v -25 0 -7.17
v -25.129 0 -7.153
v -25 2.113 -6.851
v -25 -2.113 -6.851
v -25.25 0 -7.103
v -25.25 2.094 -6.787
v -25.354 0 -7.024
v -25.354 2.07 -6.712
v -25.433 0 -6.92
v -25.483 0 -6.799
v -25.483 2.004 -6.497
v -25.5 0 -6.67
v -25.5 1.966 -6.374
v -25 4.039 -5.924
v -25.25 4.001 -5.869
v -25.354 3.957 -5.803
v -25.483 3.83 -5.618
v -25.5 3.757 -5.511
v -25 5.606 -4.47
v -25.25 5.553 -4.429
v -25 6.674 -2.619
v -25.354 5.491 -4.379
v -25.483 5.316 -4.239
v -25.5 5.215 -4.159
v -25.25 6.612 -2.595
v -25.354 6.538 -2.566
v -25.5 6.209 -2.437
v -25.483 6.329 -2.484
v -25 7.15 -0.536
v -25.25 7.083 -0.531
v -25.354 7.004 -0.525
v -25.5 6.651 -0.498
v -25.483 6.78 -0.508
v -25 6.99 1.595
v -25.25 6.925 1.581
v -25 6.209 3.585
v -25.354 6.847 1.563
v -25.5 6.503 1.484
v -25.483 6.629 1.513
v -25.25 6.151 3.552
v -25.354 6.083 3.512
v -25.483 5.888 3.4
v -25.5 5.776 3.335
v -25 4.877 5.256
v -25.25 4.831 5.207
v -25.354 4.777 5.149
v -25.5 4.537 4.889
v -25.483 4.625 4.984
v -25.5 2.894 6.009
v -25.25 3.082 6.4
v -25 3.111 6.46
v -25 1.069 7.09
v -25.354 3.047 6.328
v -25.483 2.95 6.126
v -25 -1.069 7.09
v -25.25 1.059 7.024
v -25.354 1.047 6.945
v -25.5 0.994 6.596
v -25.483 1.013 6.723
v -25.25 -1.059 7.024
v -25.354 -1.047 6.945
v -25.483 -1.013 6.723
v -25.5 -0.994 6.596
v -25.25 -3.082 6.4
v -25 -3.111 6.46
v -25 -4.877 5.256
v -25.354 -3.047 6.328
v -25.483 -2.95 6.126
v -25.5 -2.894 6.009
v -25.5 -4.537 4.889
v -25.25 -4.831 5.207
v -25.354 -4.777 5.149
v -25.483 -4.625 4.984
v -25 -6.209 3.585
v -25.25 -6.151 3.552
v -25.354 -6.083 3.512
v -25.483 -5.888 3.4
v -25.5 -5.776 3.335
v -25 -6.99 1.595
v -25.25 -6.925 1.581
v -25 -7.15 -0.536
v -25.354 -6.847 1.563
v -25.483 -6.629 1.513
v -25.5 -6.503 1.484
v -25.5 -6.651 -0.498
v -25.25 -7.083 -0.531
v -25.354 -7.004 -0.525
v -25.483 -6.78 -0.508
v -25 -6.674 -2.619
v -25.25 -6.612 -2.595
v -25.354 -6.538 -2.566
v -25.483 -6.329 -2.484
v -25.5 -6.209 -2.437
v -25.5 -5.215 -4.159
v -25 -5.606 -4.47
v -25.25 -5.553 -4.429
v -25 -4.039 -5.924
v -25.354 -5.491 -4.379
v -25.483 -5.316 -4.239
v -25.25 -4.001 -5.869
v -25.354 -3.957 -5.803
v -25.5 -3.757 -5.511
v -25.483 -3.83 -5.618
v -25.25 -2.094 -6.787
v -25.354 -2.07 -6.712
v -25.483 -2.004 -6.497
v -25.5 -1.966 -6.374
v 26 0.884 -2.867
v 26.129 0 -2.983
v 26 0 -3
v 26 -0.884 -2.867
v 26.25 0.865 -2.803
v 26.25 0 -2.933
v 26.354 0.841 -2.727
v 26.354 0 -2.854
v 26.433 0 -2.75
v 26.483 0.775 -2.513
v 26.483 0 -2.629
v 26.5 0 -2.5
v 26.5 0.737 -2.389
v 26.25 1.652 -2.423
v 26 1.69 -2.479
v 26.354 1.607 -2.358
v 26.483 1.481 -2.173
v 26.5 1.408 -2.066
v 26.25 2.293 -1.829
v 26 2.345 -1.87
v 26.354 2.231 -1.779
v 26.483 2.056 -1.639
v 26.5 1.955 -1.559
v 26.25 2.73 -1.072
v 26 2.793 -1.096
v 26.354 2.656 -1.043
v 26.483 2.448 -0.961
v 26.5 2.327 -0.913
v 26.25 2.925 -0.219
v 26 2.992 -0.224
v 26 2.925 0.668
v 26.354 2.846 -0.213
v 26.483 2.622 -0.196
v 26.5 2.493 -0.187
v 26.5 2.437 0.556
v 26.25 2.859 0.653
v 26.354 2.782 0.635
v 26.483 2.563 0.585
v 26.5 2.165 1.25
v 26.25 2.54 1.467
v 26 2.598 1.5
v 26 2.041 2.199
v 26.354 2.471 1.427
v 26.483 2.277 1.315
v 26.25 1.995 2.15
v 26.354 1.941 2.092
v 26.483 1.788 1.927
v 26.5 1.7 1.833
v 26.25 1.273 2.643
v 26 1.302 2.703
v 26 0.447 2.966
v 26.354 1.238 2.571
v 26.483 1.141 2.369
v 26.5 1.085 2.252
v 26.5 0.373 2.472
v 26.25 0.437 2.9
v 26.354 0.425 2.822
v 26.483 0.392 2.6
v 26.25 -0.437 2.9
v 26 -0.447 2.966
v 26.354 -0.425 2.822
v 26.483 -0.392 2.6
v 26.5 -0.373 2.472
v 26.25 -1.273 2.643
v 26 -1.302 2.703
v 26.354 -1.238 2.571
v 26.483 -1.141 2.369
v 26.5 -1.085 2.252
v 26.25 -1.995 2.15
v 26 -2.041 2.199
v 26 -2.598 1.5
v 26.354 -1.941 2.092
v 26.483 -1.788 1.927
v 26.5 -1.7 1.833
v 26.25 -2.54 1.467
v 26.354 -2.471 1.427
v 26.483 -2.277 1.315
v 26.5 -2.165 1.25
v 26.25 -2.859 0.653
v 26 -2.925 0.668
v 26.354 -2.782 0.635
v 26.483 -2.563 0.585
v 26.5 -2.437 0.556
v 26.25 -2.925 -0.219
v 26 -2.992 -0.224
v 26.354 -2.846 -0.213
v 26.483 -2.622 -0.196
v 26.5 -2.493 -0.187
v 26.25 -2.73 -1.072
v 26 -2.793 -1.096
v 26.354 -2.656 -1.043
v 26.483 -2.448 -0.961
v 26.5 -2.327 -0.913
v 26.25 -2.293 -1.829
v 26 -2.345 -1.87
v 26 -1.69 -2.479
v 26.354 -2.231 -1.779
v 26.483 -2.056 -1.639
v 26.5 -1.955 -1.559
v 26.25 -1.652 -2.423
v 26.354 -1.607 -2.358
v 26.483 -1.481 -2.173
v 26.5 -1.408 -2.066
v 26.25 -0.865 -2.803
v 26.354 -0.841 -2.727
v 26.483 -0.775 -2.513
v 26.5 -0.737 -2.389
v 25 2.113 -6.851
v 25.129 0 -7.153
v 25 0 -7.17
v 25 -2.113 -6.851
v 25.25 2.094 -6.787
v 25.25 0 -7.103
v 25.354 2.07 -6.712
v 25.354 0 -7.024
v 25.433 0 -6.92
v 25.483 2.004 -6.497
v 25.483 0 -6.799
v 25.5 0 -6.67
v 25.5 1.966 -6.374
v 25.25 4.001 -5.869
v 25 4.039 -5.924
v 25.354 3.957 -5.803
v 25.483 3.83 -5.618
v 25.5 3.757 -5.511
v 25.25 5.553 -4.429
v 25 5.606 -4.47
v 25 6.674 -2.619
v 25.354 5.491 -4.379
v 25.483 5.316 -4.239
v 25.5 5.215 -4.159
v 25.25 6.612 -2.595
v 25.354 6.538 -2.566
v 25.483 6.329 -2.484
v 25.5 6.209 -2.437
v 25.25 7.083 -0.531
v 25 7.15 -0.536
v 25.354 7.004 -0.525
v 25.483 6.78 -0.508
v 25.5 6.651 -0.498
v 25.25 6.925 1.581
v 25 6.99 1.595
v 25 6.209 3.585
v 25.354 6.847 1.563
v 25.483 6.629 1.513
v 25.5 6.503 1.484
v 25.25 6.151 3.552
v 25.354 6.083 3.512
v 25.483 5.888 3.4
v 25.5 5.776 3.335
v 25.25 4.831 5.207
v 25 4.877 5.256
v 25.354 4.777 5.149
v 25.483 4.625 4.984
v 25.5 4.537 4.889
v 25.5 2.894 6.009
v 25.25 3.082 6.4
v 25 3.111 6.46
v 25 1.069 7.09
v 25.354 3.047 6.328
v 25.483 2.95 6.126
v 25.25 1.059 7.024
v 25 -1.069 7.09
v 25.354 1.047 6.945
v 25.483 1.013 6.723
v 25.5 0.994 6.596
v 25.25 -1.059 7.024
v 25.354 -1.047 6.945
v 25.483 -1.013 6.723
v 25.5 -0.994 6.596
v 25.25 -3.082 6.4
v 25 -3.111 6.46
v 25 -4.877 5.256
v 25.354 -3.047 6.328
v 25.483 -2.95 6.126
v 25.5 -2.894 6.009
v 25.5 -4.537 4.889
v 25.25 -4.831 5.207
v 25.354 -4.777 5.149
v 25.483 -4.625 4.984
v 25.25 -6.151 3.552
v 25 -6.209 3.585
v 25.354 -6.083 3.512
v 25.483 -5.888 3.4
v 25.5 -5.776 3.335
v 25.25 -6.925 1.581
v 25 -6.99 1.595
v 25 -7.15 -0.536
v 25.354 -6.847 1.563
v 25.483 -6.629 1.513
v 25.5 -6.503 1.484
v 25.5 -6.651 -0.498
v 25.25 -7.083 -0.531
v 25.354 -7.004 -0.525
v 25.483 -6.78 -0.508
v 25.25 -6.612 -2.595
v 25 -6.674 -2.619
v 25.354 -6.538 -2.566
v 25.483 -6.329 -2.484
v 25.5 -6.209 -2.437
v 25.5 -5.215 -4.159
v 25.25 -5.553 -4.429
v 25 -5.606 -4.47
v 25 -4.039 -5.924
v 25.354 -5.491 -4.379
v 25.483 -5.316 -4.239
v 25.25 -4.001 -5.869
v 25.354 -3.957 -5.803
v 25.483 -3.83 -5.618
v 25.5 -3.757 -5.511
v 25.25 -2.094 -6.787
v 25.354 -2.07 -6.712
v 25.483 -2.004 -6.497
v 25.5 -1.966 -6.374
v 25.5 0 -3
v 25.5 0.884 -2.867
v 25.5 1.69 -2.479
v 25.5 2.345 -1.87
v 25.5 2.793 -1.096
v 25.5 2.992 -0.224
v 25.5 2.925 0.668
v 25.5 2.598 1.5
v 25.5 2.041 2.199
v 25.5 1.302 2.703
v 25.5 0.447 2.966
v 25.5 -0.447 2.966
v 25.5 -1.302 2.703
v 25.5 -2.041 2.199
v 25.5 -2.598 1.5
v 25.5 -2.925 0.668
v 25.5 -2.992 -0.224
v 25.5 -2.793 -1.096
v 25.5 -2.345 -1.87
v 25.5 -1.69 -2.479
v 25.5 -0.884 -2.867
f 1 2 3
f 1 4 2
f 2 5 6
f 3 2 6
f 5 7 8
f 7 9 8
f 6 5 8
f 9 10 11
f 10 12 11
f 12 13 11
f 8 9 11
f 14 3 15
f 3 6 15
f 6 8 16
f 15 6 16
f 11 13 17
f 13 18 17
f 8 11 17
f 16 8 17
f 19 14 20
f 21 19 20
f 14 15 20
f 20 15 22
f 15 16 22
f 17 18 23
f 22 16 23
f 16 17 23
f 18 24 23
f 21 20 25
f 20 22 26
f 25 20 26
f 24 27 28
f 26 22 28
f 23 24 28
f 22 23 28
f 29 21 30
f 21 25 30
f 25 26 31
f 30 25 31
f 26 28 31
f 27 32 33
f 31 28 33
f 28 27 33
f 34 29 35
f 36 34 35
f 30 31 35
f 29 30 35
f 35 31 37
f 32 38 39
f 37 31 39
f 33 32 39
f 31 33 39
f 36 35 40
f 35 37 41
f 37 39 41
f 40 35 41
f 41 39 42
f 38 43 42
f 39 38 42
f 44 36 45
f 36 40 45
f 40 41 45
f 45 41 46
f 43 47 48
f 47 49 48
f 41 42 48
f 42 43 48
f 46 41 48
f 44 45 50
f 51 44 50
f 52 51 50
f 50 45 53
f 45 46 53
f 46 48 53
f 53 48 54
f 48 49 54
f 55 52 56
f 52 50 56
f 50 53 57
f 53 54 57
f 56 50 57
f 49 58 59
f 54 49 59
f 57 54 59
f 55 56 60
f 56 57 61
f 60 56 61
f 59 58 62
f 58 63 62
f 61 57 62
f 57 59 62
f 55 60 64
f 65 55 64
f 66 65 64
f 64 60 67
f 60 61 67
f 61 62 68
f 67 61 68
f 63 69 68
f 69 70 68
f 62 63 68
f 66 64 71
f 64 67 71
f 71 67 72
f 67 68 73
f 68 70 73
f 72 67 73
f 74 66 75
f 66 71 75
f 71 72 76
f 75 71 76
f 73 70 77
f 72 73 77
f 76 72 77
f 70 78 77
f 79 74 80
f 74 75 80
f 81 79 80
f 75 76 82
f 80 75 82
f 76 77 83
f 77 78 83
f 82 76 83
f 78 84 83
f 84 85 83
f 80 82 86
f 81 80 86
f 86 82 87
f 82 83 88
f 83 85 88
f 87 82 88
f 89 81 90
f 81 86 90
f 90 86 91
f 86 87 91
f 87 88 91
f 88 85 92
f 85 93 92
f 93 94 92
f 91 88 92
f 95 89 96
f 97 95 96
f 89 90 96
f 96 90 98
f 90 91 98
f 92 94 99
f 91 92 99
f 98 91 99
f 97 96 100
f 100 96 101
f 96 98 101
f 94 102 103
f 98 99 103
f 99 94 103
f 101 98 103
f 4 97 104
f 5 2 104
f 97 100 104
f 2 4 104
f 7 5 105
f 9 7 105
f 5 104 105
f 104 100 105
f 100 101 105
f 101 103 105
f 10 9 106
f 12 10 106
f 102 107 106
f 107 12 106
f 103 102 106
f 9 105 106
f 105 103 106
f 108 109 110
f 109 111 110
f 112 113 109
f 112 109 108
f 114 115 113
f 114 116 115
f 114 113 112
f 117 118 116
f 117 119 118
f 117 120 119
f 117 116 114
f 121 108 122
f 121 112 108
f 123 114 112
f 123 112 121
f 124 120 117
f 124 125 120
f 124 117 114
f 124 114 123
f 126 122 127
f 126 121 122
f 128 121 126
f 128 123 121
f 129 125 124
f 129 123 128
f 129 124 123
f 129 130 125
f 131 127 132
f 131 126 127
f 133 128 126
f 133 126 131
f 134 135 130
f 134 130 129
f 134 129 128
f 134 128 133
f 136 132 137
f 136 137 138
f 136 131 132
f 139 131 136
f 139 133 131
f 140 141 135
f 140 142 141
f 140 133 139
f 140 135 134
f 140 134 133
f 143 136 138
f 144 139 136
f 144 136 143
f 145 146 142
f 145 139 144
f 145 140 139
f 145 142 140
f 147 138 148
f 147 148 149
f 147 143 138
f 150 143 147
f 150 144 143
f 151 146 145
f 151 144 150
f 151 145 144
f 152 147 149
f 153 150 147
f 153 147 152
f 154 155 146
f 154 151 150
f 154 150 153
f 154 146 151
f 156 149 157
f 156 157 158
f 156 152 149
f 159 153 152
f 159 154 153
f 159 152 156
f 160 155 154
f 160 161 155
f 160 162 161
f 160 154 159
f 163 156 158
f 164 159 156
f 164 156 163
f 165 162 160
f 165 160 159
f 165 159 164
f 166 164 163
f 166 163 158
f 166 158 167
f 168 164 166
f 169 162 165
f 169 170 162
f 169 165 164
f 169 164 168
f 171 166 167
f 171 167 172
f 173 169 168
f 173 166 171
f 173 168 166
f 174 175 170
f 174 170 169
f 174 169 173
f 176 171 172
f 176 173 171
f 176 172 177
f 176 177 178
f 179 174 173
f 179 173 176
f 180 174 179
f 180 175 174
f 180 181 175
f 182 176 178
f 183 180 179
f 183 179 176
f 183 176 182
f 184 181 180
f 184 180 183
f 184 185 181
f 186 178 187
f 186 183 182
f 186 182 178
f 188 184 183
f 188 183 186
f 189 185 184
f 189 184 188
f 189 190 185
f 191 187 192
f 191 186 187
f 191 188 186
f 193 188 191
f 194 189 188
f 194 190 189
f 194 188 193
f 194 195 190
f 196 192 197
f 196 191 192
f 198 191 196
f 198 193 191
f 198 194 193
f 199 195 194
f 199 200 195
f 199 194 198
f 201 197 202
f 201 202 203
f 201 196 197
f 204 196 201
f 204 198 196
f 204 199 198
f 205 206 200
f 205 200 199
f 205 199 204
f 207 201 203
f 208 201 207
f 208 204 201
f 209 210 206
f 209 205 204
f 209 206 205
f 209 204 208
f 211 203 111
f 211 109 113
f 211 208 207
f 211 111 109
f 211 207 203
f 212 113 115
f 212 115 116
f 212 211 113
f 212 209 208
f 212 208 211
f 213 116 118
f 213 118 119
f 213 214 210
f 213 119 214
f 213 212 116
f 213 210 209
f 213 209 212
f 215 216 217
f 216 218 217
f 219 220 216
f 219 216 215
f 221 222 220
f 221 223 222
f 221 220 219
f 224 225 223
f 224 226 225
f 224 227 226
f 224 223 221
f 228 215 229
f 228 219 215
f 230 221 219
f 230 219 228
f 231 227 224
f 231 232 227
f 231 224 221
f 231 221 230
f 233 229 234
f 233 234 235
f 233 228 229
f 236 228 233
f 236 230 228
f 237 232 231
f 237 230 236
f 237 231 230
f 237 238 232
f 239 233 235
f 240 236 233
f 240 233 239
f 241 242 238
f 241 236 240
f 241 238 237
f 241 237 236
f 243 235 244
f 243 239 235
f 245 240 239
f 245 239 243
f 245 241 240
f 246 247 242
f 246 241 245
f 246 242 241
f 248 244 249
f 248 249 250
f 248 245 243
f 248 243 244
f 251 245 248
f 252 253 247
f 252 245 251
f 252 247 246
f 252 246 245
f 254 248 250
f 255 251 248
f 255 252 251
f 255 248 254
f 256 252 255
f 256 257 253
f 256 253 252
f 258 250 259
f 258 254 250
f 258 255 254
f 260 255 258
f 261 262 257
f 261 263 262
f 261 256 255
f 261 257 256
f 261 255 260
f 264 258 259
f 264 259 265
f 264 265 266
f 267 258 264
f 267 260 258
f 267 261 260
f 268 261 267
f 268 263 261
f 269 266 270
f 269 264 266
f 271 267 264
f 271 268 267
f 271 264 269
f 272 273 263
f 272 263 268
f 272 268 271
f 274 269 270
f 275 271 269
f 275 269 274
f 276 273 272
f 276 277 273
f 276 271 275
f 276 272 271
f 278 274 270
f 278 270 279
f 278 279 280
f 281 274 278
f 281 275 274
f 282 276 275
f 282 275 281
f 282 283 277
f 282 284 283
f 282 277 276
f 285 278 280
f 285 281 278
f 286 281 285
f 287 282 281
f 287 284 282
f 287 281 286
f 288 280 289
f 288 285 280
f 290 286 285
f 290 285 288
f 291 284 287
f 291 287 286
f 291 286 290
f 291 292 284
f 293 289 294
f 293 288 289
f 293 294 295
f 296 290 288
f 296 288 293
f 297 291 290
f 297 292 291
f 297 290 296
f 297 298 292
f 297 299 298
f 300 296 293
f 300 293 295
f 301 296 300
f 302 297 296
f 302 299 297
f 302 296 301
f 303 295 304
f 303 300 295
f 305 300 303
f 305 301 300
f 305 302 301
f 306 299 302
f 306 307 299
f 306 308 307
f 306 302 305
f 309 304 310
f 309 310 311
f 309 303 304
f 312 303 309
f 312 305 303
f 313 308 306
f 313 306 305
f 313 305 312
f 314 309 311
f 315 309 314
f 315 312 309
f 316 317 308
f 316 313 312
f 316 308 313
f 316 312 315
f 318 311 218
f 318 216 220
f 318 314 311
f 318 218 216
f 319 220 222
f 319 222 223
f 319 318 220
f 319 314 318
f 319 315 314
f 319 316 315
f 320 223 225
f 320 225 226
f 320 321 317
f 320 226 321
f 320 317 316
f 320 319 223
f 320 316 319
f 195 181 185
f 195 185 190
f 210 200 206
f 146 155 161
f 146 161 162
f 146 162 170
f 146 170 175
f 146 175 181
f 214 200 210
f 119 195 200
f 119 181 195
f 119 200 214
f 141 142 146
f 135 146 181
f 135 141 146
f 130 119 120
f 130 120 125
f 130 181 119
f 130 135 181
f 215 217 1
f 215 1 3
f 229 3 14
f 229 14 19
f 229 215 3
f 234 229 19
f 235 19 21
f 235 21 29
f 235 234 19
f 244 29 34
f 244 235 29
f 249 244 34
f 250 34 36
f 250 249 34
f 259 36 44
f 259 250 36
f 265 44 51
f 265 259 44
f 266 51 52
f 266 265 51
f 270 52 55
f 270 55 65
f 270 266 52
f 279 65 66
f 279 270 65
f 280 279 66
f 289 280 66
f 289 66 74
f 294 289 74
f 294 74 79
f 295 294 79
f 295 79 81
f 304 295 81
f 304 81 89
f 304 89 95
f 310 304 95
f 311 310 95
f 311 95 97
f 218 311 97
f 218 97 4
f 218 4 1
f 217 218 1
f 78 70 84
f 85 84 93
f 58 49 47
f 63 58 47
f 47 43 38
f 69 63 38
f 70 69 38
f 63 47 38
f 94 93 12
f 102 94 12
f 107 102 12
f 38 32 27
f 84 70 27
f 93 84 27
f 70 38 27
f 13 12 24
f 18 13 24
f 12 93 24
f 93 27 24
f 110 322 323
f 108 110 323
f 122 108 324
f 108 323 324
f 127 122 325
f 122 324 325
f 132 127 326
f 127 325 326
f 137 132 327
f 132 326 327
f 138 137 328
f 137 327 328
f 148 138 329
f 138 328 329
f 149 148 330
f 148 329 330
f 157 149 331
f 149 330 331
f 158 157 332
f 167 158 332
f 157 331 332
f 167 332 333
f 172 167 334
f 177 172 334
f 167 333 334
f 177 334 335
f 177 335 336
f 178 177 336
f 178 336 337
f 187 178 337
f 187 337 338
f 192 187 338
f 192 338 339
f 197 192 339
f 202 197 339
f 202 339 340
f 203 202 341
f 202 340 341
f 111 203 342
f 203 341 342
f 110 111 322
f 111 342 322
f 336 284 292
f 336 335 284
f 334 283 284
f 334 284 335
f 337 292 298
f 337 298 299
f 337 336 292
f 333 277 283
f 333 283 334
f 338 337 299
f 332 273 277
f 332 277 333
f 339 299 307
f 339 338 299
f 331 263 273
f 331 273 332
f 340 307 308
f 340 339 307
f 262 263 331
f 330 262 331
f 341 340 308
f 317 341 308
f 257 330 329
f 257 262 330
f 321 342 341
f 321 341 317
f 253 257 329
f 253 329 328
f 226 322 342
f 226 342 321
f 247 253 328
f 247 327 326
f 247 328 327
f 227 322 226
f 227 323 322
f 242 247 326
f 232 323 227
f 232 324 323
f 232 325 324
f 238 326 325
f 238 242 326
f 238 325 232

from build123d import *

# Parameters (mm, degrees)
SKETCH1_R           = 7.17
BOSS_EXTRUDE1_DEPTH = 25.5
SKETCH2_R           = 3
BOSS_EXTRUDE2_DEPTH = 1
FILLET1_R           = 0.5


with BuildPart() as part:
    # Sketch1 → Boss-Extrude1 (new, symmetric)
    with BuildSketch(Plane(origin=(0, 0, 0), x_dir=(0, 0, -1), z_dir=(1, 0, 0))):
        Circle(SKETCH1_R)
    extrude(amount=BOSS_EXTRUDE1_DEPTH, both=True)

    # Sketch2 → Boss-Extrude2 (add)
    with BuildSketch(Plane(origin=(25.5, 0, 0), x_dir=(0, 0, -1), z_dir=(1, 0, 0))):
        Circle(SKETCH2_R)
    extrude(amount=BOSS_EXTRUDE2_DEPTH)

    # Fillet1
    fillet1_edges = [part.edges().sort_by_distance(p)[0] for p in [
        (-25.5, 0, 7.17),
        (25.5, 0, 7.17),
        (26.5, 0, 3),
    ]]
    fillet(fillet1_edges, radius=FILLET1_R)


solid = part.part
